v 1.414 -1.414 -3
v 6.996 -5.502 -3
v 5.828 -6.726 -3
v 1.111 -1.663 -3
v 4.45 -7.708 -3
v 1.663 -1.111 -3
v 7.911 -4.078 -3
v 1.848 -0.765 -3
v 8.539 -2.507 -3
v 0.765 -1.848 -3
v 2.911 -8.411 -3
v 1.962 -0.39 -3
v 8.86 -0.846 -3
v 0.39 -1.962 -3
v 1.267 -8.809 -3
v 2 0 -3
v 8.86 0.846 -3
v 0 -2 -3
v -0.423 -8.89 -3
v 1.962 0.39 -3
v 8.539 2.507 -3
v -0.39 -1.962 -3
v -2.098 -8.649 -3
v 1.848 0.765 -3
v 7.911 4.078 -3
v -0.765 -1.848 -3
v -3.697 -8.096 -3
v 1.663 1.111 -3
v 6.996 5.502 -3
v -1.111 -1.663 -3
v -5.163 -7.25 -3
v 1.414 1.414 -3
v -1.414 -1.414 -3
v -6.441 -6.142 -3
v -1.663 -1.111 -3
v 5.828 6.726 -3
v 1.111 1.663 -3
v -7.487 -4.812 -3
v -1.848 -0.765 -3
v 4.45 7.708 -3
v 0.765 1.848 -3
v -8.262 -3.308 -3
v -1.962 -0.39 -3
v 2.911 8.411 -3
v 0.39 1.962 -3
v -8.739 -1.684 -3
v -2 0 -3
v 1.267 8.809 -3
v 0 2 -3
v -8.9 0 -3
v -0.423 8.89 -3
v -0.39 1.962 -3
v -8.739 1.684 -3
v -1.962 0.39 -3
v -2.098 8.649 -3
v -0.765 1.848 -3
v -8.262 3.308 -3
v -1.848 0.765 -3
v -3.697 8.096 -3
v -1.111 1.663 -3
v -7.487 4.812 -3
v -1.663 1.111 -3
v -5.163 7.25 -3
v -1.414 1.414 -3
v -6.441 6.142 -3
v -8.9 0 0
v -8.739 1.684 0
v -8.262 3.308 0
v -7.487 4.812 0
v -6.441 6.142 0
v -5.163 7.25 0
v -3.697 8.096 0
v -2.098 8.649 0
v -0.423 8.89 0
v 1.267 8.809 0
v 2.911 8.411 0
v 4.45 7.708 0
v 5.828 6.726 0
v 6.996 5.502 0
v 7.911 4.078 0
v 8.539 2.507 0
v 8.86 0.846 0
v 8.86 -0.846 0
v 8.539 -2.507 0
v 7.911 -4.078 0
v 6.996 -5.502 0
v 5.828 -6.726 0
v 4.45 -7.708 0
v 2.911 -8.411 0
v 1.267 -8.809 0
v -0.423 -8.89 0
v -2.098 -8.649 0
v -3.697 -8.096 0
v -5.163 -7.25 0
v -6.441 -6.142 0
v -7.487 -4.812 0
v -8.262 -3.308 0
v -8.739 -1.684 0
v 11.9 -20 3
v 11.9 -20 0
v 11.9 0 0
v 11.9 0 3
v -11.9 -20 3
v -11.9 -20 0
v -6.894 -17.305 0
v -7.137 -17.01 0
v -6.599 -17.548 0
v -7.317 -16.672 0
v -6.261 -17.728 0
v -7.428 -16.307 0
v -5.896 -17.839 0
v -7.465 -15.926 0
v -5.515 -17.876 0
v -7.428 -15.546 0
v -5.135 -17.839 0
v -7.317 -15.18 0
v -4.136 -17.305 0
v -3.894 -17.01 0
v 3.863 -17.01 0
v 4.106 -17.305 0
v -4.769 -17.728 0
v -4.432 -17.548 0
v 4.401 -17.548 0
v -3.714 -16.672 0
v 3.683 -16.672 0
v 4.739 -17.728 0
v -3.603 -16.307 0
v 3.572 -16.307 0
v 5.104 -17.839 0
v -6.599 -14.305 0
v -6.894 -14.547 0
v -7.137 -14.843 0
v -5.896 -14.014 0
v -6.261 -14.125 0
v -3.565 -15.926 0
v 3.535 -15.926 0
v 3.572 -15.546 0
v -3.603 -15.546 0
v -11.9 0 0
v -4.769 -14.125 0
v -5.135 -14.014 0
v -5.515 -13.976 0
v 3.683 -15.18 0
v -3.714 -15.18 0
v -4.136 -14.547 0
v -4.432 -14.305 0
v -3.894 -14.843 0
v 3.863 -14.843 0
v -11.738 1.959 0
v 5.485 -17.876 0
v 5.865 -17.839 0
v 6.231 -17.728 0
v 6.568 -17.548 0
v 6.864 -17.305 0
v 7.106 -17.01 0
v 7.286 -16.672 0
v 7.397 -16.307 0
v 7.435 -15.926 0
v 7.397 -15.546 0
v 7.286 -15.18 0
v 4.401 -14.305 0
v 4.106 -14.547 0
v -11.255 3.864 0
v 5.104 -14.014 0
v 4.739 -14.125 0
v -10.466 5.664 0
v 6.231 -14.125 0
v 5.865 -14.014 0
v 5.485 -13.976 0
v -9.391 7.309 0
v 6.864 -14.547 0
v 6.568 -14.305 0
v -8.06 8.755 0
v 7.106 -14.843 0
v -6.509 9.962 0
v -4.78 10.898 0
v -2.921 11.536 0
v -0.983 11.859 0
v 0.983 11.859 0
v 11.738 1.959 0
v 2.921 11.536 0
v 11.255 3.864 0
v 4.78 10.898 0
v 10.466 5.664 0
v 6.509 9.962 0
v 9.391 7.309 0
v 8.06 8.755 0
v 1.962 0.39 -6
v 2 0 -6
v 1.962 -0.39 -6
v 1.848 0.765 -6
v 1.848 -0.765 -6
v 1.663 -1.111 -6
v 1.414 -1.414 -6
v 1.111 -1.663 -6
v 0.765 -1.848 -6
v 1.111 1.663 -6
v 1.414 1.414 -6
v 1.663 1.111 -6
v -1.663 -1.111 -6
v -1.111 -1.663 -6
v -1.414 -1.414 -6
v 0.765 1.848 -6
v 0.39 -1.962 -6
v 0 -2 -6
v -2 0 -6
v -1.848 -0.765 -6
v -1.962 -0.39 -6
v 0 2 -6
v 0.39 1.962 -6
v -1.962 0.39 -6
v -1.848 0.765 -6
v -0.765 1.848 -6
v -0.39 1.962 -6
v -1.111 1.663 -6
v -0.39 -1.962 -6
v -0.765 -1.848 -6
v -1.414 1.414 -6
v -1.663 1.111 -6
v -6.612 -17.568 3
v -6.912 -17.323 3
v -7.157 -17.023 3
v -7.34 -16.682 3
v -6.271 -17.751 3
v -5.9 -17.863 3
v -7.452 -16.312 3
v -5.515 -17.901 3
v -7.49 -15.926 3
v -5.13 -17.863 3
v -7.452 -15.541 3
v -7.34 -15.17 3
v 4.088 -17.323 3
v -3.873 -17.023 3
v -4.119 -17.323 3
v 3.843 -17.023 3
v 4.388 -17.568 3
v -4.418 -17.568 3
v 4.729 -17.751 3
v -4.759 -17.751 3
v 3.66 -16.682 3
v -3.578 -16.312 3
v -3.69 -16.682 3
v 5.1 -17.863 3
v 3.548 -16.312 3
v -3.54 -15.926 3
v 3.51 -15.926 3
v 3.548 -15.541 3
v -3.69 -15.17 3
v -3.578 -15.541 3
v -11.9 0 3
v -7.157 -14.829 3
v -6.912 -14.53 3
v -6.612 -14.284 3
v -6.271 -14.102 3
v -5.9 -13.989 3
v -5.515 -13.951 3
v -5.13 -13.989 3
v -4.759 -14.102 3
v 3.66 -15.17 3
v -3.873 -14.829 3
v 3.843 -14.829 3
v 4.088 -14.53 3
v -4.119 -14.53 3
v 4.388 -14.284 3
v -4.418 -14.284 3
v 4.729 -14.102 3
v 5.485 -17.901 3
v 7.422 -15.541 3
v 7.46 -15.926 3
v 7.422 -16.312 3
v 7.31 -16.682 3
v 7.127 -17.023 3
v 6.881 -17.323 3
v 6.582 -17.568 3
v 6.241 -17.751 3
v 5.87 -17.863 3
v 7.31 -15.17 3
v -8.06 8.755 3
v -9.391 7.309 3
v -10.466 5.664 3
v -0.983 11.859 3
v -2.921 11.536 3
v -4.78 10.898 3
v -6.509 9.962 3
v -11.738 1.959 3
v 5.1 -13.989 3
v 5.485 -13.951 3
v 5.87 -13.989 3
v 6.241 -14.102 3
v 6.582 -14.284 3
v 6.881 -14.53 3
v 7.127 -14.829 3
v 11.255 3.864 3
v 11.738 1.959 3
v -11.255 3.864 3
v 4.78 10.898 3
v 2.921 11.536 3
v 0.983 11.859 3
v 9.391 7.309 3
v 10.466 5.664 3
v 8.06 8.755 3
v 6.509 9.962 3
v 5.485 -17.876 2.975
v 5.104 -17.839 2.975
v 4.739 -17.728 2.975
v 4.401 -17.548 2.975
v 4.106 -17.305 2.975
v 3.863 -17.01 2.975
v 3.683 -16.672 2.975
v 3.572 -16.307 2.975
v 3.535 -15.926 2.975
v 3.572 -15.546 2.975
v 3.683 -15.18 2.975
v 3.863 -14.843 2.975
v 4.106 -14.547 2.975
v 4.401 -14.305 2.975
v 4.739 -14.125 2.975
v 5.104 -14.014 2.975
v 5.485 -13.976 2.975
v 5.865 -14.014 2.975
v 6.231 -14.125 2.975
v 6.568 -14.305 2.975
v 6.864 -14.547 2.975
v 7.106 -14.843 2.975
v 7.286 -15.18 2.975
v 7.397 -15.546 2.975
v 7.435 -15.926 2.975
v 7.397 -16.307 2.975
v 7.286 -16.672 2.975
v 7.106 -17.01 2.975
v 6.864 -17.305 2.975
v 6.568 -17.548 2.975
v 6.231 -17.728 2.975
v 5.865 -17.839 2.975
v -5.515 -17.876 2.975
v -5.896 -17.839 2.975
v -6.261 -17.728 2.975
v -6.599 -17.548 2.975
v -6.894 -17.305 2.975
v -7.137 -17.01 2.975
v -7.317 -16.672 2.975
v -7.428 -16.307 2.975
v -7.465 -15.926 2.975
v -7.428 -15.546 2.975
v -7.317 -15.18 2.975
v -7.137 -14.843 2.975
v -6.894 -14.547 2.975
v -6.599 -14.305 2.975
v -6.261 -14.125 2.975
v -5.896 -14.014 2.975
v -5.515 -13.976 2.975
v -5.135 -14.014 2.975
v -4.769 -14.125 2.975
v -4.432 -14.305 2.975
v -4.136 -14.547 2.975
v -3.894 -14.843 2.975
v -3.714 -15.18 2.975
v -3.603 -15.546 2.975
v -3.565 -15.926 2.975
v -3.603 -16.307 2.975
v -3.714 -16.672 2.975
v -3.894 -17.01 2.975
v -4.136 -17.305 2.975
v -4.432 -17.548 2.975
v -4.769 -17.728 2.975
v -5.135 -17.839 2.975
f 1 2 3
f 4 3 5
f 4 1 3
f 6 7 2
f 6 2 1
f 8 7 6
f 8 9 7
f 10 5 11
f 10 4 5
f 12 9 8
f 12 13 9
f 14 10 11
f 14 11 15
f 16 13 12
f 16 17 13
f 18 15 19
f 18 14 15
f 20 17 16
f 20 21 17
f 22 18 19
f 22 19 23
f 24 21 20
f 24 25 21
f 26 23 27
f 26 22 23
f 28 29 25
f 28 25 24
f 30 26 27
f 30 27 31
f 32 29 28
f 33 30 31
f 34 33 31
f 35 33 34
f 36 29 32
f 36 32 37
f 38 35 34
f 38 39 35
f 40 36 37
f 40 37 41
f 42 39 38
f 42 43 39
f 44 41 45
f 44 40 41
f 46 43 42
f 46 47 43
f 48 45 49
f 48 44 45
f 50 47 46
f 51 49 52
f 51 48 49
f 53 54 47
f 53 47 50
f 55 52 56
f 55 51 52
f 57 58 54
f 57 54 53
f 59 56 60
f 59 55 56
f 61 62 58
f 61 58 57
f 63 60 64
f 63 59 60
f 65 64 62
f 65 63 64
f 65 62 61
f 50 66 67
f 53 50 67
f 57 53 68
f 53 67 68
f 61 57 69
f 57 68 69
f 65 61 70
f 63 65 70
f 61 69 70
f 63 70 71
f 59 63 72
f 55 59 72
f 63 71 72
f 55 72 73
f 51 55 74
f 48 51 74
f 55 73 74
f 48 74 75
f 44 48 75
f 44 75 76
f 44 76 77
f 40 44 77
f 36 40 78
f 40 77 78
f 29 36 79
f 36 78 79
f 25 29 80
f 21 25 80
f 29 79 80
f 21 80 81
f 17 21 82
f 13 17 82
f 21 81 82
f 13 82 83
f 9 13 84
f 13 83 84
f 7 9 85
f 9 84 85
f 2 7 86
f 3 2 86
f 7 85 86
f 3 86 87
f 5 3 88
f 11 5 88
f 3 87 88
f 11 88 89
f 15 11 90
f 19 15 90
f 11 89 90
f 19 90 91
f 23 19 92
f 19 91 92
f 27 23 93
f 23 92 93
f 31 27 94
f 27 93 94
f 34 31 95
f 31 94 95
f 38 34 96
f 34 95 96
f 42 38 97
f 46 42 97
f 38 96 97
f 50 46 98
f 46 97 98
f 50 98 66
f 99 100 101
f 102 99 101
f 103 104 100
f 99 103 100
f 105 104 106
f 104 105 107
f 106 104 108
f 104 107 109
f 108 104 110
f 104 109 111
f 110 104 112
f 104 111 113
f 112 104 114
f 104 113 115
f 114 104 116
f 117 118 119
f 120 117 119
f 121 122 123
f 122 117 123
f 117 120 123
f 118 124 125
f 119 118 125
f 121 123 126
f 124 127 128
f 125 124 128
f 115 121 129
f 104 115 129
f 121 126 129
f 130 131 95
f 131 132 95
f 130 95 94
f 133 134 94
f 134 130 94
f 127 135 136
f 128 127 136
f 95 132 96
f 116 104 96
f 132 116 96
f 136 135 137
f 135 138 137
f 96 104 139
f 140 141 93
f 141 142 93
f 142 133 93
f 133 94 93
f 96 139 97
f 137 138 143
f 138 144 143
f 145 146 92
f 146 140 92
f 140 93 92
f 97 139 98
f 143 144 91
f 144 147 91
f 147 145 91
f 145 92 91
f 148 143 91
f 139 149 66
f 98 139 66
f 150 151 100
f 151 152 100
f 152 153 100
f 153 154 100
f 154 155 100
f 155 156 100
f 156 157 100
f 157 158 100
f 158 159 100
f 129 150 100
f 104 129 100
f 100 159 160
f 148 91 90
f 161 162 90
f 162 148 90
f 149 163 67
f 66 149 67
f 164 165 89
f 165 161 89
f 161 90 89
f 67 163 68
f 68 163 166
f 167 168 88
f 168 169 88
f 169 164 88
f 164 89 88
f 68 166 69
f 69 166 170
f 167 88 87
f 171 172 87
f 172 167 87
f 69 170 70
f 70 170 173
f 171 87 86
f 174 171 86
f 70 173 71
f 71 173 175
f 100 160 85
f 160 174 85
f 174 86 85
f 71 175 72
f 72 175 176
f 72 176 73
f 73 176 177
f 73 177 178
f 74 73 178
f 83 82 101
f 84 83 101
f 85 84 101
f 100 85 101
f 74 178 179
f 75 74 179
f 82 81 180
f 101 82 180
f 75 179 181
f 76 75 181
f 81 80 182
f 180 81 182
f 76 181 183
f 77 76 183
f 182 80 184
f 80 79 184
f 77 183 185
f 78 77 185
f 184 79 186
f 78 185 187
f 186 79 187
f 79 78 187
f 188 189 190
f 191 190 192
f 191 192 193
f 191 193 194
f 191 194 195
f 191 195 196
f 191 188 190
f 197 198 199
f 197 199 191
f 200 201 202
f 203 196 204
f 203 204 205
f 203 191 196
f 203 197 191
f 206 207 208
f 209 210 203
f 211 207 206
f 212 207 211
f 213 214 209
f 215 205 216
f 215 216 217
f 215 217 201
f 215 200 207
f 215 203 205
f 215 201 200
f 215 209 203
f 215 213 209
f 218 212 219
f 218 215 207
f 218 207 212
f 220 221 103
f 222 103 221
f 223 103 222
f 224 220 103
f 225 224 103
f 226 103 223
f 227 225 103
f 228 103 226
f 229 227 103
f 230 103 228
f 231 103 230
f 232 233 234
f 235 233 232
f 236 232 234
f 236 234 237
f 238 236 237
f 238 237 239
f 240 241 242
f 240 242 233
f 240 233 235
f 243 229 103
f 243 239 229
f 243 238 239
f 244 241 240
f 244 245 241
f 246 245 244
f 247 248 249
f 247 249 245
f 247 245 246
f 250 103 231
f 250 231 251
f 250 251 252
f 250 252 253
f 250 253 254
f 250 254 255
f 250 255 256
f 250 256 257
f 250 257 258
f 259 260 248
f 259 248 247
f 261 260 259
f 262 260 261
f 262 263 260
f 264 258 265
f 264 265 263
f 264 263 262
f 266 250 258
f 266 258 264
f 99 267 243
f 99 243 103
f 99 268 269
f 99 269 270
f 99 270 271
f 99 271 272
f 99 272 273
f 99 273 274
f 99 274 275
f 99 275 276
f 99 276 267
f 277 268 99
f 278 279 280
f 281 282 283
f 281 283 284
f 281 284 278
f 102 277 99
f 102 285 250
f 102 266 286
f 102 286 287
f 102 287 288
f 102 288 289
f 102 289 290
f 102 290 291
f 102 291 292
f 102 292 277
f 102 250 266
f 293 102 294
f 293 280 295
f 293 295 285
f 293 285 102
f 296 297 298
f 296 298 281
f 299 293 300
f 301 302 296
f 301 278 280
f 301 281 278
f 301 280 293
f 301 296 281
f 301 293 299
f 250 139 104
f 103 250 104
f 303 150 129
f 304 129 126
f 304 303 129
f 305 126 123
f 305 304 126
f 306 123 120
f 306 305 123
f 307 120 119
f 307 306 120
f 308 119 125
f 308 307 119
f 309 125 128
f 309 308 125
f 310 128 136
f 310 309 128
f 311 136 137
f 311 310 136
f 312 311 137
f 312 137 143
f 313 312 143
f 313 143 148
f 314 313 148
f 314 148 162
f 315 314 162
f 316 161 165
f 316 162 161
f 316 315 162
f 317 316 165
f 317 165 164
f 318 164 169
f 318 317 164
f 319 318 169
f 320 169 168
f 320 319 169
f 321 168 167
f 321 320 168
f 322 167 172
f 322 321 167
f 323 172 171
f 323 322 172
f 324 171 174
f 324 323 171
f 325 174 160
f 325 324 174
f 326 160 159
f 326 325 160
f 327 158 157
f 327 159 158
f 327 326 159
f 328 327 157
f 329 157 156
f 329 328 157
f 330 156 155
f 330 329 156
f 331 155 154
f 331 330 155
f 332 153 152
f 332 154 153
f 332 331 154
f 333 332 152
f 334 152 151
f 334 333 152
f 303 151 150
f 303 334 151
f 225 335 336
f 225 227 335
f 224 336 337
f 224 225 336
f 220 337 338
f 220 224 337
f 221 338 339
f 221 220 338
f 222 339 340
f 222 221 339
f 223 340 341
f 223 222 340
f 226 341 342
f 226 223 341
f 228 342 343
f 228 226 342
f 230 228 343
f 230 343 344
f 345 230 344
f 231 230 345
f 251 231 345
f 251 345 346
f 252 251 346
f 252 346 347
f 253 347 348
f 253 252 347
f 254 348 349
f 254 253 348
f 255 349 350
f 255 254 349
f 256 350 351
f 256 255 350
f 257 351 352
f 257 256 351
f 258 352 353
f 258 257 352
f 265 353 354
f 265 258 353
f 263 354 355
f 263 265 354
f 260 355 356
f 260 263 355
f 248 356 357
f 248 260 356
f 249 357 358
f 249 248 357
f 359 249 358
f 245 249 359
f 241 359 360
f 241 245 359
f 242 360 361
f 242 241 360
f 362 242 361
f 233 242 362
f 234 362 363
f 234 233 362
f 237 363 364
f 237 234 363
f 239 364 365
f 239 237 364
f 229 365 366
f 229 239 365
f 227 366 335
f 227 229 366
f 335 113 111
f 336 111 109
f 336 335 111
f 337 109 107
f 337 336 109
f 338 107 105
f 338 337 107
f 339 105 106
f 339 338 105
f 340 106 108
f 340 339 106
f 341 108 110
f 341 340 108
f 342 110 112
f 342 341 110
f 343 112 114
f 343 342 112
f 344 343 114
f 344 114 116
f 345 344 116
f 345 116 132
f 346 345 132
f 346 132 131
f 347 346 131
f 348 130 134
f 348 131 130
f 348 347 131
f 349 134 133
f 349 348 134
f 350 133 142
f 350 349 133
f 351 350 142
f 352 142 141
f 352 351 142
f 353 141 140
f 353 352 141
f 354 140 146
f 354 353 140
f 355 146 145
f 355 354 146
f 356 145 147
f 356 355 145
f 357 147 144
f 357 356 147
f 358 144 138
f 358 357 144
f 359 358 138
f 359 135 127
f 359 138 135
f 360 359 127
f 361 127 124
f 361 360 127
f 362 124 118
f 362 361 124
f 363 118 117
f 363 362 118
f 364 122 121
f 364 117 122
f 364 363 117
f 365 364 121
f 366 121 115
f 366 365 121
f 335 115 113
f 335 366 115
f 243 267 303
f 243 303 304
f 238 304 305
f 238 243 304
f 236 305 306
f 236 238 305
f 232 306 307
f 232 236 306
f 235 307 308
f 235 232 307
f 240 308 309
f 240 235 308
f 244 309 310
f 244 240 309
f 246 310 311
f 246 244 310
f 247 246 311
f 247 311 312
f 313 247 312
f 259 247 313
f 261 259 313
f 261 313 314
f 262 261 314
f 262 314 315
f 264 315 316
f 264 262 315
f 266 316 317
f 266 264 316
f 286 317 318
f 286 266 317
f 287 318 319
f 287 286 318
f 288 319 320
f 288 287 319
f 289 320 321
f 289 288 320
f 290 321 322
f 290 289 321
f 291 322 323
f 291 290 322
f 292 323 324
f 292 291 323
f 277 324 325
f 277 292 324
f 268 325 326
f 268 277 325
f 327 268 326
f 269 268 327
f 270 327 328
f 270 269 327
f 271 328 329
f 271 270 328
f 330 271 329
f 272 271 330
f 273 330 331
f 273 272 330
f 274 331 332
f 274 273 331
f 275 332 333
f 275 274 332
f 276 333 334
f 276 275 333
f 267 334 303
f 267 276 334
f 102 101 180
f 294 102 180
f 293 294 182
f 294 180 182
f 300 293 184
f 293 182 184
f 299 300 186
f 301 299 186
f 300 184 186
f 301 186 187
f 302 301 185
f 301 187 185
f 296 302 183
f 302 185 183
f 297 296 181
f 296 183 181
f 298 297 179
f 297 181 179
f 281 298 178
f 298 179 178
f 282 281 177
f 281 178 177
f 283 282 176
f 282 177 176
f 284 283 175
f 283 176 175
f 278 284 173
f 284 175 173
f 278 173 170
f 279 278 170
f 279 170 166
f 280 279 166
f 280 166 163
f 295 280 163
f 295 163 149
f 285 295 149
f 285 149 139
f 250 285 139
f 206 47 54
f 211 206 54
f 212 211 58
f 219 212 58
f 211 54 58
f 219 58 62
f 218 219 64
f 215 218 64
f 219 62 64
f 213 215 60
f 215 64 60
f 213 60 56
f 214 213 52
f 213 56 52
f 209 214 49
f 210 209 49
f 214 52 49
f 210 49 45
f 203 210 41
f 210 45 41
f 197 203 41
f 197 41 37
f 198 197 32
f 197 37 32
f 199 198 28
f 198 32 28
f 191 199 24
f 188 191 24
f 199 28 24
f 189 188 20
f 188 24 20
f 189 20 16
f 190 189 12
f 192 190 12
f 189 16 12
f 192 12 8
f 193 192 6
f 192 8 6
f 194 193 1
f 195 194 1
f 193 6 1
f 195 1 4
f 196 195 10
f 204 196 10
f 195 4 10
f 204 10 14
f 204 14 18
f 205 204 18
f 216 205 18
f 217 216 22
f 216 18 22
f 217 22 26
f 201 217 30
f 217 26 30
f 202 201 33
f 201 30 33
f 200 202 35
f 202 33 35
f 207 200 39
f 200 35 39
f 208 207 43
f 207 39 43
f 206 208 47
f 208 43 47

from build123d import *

# Parameters (mm, degrees)
BOSS_EXTRUDE1_DEPTH             = 3
SKETCH2_R                       = 8.9
BOSS_EXTRUDE2_DEPTH             = 3
SKETCH3_R                       = 2
BOSS_EXTRUDE3_DEPTH             = 3
M3_5_CLEARANCE_HOLE1_AT_2_COUNT = 2
M3_5_CLEARANCE_HOLE1_AT_2_PITCH = 11
M3_5_CLEARANCE_HOLE1_AT_3_COUNT = 2
M3_5_CLEARANCE_HOLE1_AT_3_PITCH = 11


with BuildPart() as part:
    # Sketch1 → Boss-Extrude1 (new body)
    with BuildSketch(Plane.XY):
        with BuildLine():
            Line((-11.9, 0), (-11.9, -20))
            Line((-11.9, -20), (11.9, -20))
            Line((11.9, -20), (11.9, 0))
            ThreePointArc((11.9, 0), (0, 11.9), (-11.9, 0))
        make_face()
    extrude(amount=BOSS_EXTRUDE1_DEPTH)

    # Sketch2 → Boss-Extrude2 (add)
    with BuildSketch(Plane(origin=(0, 0, 0), x_dir=(-1, 0, 0), z_dir=(0, 0, -1))):
        Circle(SKETCH2_R)
    extrude(amount=BOSS_EXTRUDE2_DEPTH)

    # Sketch3 → Boss-Extrude3 (add)
    with BuildSketch(Plane(origin=(0, 0, -3), x_dir=(-1, 0, 0), z_dir=(0, 0, -1))):
        Circle(SKETCH3_R)
    extrude(amount=BOSS_EXTRUDE3_DEPTH)

    # Sketch5 → M3.5 Clearance Hole1 (revolve, cut)
    with BuildSketch(Plane(origin=(-5.515156433, -15.92620122, 3), x_dir=(0, -1, 0), z_dir=(1, 0, 0))):
        Polygon((0, 0), (0, 9), (1.95, 9), (1.95, 0.025), (1.975, 0), align=None)
    m3_5_clearance_hole1 = revolve(axis=Axis((-5.515156433, -15.92620122, 9.35), (0, 0, -1)), mode=Mode.SUBTRACT)

    # M3.5 Clearance Hole1 at 2: M3.5 Clearance Hole1 ×2
    with Locations(*[(i * M3_5_CLEARANCE_HOLE1_AT_2_PITCH, 0, 0) for i in range(1, M3_5_CLEARANCE_HOLE1_AT_2_COUNT)]):
        add(m3_5_clearance_hole1, mode=Mode.SUBTRACT)

    # M3.5 Clearance Hole1 at 3: M3.5 Clearance Hole1 ×2
    with Locations(*[(i * M3_5_CLEARANCE_HOLE1_AT_3_PITCH, 0, 0) for i in range(1, M3_5_CLEARANCE_HOLE1_AT_3_COUNT)]):
        add(m3_5_clearance_hole1, mode=Mode.SUBTRACT)


solid = part.part
